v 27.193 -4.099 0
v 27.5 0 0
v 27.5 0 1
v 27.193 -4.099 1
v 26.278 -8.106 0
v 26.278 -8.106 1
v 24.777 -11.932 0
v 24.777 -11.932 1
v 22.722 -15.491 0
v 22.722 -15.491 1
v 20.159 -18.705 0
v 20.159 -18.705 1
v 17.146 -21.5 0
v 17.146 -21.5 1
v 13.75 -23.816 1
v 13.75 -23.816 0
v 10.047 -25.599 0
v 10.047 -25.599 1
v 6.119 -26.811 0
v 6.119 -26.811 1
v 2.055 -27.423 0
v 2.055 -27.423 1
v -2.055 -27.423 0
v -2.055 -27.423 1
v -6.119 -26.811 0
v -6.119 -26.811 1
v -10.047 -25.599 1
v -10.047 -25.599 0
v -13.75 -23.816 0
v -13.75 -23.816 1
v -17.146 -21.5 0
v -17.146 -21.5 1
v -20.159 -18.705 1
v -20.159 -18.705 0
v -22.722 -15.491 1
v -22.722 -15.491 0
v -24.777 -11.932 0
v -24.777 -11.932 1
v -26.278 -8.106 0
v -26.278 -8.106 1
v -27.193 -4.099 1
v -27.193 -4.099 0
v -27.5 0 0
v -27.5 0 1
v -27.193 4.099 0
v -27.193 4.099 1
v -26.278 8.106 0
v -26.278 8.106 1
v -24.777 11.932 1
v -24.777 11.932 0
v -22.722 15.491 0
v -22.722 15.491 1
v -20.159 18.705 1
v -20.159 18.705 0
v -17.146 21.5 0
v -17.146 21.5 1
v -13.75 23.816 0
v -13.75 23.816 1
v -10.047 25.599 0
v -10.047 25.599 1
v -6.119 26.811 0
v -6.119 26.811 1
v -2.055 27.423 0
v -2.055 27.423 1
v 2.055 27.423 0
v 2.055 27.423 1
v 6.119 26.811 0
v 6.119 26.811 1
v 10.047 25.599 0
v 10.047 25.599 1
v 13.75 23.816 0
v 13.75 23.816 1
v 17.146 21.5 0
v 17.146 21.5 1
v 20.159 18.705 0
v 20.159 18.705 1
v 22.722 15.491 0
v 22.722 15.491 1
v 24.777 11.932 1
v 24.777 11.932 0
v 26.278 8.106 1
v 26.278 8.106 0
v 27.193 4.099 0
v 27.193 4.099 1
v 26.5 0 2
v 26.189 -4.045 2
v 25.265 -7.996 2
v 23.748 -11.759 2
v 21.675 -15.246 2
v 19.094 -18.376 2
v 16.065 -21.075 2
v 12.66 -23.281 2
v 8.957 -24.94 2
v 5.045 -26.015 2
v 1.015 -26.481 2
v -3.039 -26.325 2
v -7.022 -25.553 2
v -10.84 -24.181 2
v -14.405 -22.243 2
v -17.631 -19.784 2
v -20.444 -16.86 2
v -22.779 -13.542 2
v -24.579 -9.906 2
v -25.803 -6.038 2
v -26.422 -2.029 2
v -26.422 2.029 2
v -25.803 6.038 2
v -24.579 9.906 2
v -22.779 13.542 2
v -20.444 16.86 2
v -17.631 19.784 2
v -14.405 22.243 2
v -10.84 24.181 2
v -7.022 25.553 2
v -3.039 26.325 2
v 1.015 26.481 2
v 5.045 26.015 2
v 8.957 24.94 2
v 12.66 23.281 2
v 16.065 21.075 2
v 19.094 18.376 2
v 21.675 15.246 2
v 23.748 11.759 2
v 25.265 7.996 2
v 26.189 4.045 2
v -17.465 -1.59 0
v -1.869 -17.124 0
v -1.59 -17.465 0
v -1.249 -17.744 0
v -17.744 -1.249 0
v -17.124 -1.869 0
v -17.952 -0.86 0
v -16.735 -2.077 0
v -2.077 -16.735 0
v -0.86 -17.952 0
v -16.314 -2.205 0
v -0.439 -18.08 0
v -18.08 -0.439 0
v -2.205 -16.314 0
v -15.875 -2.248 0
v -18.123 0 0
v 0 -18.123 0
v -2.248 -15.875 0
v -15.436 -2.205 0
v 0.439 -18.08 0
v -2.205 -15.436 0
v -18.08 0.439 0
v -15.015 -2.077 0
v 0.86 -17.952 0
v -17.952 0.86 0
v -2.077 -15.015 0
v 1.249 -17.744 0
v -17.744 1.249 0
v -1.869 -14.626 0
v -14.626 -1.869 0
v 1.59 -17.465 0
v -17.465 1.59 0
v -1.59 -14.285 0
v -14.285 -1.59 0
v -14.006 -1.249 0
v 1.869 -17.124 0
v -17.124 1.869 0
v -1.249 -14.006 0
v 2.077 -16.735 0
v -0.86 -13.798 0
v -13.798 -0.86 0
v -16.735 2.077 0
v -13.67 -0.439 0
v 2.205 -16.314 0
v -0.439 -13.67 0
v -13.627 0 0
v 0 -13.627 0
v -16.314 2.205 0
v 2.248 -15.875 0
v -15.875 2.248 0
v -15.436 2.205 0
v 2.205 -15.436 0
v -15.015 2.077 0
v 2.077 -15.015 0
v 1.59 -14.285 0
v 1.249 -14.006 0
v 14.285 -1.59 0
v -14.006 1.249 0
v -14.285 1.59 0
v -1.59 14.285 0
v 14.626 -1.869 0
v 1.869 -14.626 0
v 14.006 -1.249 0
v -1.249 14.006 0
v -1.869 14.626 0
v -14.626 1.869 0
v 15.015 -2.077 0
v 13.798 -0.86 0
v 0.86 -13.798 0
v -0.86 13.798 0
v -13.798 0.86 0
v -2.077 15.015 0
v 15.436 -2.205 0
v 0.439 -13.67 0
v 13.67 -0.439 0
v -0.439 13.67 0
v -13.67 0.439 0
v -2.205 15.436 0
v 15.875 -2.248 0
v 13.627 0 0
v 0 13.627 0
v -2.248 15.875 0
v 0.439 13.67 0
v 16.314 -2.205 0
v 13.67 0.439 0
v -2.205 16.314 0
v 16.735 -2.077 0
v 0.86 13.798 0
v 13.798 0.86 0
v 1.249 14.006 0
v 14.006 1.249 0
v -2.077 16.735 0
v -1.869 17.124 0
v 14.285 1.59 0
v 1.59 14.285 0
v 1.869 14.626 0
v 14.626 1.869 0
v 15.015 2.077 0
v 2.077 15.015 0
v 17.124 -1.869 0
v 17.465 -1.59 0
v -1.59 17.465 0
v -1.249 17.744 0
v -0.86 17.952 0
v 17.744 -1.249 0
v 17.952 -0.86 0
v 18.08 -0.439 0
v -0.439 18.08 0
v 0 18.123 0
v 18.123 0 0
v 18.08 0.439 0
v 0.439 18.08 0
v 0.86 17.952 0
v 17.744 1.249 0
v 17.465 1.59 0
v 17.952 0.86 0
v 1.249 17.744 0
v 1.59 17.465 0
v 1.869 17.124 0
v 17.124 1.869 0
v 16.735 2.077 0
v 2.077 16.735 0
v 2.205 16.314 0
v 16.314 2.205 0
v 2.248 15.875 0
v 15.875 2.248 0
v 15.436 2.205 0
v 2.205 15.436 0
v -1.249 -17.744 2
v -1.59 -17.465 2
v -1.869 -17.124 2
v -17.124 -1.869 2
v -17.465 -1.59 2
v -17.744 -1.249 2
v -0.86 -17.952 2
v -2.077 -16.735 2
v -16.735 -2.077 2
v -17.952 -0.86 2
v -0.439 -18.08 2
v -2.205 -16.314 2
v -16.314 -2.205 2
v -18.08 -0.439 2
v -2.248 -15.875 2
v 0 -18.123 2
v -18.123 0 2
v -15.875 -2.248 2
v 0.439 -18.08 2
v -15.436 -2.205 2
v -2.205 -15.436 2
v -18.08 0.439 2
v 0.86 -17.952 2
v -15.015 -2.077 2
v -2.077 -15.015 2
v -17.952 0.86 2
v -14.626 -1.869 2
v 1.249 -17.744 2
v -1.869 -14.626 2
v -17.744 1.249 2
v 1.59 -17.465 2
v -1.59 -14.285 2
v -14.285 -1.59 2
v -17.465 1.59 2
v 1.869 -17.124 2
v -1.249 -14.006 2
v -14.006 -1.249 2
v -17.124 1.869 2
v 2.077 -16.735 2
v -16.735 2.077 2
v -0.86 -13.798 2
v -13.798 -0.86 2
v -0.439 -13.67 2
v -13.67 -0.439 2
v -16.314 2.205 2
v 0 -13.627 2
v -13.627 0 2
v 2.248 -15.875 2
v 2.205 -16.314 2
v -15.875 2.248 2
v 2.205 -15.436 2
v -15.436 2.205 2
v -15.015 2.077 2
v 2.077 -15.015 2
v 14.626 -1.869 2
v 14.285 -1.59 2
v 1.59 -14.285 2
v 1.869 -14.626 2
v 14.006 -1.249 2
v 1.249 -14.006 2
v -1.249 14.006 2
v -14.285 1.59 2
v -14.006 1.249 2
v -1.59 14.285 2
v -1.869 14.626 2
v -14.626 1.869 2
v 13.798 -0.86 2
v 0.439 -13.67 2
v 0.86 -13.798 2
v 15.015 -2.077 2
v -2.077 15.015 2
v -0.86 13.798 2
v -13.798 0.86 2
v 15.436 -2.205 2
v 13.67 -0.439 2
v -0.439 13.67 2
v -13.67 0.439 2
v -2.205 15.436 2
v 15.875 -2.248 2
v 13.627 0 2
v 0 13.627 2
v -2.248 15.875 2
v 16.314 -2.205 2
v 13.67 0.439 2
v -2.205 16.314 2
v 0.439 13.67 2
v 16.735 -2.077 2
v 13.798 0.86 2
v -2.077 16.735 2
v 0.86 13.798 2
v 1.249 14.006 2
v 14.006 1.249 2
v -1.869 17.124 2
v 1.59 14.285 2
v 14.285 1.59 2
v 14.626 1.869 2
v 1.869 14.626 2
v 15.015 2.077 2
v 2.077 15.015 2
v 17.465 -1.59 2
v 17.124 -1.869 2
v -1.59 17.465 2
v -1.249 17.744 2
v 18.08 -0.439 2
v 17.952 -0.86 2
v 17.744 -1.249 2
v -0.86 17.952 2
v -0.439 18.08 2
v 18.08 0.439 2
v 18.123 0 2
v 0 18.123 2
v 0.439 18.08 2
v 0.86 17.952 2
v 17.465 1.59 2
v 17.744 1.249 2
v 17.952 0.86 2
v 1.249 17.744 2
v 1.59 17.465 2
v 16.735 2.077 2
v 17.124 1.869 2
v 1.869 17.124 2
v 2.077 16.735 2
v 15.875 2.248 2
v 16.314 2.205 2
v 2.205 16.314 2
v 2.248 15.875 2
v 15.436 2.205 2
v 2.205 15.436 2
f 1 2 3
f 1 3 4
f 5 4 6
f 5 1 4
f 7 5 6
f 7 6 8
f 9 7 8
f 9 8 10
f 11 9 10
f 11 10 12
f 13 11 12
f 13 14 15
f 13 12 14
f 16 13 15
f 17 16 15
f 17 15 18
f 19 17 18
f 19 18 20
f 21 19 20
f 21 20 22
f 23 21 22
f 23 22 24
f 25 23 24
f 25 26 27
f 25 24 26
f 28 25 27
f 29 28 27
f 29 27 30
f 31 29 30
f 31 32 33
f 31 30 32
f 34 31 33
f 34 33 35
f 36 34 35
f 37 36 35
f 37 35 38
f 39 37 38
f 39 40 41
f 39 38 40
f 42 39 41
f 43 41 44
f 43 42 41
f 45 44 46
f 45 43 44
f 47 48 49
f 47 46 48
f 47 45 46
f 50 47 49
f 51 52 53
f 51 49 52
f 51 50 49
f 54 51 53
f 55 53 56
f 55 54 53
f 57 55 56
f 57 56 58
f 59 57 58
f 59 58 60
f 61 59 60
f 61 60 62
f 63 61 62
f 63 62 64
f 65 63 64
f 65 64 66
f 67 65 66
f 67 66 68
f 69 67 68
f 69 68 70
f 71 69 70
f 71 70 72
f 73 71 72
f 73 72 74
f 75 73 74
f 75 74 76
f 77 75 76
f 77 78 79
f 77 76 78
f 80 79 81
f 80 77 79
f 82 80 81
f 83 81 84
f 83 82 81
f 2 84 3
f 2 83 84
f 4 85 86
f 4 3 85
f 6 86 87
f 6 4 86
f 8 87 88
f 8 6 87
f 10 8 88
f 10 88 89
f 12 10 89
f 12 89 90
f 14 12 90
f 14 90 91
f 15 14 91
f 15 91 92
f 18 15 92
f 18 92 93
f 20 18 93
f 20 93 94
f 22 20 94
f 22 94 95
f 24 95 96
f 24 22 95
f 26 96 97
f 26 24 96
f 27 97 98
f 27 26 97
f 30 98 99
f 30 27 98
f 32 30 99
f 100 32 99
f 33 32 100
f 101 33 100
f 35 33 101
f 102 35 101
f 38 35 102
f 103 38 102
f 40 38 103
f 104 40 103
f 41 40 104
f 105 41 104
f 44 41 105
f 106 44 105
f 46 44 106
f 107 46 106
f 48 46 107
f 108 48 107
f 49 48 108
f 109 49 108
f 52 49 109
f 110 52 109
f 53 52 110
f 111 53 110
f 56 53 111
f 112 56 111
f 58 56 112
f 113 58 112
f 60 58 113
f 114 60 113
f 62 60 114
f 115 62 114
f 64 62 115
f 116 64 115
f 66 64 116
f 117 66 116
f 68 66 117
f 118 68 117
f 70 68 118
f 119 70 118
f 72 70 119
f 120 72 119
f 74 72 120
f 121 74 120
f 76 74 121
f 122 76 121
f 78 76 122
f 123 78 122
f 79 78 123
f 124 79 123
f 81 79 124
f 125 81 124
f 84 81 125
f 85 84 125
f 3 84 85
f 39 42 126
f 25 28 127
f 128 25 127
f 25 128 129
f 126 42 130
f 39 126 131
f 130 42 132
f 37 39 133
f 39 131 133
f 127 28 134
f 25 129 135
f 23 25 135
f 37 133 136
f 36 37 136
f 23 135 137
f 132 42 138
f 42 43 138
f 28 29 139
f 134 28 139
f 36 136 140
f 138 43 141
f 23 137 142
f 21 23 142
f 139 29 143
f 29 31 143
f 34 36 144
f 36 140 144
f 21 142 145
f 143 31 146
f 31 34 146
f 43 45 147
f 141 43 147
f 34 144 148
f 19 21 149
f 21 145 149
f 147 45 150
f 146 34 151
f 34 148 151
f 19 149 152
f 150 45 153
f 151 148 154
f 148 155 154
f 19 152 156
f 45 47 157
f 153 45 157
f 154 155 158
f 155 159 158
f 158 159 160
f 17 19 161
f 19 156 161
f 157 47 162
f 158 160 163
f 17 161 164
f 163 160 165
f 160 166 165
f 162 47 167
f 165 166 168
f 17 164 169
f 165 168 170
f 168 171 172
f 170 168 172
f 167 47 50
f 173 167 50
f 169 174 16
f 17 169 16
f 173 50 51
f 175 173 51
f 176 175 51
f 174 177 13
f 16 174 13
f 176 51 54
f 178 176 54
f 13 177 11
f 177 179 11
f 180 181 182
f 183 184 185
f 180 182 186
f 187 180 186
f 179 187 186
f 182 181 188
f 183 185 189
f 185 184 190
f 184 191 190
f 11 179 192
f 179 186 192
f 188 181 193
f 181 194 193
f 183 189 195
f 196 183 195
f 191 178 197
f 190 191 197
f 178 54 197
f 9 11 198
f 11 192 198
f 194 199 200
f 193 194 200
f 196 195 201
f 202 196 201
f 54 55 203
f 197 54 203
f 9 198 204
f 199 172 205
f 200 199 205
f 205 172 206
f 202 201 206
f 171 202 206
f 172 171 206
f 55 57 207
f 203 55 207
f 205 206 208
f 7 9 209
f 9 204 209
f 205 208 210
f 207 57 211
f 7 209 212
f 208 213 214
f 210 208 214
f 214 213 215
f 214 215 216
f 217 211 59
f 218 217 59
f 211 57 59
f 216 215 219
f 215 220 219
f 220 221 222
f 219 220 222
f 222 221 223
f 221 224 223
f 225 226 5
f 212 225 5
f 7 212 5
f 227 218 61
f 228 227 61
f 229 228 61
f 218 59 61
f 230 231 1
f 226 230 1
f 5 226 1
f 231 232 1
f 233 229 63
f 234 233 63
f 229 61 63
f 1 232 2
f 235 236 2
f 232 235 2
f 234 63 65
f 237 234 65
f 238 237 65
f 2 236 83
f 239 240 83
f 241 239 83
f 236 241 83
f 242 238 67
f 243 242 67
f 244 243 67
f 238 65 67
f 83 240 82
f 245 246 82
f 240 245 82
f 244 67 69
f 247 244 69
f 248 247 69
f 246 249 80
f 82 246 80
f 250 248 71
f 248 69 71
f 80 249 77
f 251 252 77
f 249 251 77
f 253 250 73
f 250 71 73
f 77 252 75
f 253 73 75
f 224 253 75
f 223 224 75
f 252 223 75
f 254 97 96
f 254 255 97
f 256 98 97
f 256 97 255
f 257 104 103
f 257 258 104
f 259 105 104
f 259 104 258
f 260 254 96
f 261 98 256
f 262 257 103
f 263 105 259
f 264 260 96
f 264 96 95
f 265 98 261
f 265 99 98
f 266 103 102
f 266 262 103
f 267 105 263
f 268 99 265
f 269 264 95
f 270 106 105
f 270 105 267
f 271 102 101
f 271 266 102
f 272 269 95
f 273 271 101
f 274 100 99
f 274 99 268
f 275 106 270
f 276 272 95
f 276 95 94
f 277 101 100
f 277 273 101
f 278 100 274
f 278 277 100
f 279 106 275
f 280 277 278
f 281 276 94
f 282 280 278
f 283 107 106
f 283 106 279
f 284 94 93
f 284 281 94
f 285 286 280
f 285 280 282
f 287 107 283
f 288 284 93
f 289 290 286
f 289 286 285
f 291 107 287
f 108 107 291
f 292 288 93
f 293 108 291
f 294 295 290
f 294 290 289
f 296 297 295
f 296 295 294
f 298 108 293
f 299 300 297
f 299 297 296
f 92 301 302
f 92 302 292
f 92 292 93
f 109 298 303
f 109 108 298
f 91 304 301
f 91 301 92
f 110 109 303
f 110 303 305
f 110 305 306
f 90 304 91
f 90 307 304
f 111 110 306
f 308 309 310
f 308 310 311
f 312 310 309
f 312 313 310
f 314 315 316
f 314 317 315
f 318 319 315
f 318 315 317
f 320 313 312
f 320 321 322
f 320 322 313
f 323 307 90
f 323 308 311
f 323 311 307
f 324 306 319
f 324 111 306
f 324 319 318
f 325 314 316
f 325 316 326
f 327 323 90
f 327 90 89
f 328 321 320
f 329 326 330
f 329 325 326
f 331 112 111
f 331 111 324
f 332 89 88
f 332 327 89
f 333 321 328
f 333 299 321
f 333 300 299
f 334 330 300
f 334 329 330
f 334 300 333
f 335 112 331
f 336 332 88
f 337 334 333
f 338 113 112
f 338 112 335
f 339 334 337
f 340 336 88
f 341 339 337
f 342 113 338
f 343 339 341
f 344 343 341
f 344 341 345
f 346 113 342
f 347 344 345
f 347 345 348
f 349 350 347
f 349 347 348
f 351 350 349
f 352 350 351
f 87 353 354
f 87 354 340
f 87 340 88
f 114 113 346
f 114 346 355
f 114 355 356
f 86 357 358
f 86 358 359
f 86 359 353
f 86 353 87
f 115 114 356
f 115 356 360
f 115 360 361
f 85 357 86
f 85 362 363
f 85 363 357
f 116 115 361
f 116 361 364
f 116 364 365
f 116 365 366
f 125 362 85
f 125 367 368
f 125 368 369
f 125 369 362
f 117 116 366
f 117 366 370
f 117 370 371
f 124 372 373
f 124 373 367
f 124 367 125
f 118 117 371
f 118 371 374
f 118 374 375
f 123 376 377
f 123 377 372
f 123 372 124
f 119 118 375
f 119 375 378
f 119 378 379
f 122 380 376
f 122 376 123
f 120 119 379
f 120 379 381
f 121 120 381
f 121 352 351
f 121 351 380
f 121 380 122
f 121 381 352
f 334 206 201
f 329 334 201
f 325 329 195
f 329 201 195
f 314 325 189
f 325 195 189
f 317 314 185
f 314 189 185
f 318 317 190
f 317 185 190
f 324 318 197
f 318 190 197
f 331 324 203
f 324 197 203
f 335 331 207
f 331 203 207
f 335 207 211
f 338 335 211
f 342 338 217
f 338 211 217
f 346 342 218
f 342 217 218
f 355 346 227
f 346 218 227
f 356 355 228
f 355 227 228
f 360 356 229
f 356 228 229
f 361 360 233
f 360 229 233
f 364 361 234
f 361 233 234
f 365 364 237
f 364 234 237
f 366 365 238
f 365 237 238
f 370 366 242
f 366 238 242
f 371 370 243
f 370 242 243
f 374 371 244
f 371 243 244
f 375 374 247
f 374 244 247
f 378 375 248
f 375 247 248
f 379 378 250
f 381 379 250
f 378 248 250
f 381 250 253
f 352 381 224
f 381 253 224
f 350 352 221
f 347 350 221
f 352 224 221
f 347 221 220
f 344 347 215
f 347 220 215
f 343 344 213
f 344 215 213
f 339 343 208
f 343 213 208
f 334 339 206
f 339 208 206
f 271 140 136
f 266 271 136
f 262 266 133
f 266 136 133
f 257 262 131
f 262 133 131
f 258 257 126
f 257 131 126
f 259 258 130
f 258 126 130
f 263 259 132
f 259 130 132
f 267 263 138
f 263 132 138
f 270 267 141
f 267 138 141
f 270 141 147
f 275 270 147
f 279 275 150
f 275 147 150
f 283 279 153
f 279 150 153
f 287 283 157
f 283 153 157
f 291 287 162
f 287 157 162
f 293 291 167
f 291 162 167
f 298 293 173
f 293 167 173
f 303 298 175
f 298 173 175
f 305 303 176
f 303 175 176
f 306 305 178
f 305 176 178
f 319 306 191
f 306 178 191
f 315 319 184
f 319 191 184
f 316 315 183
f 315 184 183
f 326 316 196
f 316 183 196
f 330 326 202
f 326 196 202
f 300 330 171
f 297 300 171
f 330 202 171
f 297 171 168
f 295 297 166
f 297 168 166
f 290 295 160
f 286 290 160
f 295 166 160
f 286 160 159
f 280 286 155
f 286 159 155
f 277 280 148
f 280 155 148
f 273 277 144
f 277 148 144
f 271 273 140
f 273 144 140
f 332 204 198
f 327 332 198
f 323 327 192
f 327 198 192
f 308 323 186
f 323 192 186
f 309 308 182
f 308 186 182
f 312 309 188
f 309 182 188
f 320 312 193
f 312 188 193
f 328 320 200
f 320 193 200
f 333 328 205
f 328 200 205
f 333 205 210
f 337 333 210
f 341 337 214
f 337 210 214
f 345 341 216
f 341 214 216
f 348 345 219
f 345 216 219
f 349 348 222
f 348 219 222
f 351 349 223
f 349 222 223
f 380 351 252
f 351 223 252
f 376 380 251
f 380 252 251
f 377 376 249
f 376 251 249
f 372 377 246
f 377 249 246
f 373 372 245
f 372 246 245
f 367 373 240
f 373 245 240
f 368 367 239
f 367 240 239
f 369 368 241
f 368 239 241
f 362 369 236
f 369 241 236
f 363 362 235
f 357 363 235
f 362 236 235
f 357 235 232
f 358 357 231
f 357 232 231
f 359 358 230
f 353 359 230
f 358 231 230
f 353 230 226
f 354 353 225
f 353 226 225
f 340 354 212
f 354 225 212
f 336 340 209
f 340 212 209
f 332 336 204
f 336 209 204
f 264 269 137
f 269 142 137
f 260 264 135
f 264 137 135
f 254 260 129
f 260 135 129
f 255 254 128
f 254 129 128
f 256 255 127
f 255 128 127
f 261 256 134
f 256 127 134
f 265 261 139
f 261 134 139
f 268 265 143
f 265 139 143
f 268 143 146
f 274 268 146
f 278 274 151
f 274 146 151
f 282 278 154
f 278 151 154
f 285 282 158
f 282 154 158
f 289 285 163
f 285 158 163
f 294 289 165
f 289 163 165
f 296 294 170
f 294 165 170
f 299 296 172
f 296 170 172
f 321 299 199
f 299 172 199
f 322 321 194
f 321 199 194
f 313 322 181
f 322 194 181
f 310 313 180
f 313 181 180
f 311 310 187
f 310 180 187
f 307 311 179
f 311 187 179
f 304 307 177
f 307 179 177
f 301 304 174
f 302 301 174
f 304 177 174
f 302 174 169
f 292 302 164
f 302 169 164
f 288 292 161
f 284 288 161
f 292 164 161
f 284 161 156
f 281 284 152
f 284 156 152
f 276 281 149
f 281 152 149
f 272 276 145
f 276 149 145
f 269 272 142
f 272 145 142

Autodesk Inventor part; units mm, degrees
ref_plane "YZ Plane" through (0, 0, 0) normal (1, 0, 0) x (0, 1, 0)
ref_plane "XZ Plane" through (0, 0, 0) normal (0, 1, 0) x (-1, 0, 0)
ref_plane "XY Plane" through (0, 0, 0) normal (0, 0, 1) x (1, 0, 0)
sketch "Sketch1" plane through (0, 0, 0) normal (0, 0, 1) x (1, 0, 0)
  circle A0 centre (0, 0) radius 27.5
  dimension "d0" = 55
extrude "Extrusion1" add sketch "Sketch1" along normal blind 2
chamfer "Chamfer1" distance 1 angle 45 1 edges at (-27.5, 0, 2)
sketch "Sketch2" plane through (0, 0, 2) normal (0, 0, 1) x (1, 0, 0)
  circle A0 centre (0, 0) radius 15.875 construction
  point P0 (0, 15.875)
  point P1 (-15.875, 0)
  point P2 (0, -15.875)
  point P3 (15.875, 0)
  dimension "d6" = 31.75
  dimension "d9" = 360
hole "Hole1" at (0, 15.875, 2) at (-15.875, 0, 2) at (0, -15.875, 2) at (15.875, 0, 2) direction (0, 0, -1) diameter 4.4958 end through all clearance for "Flat Head Machine Screw (82)" size "#8" standard "Ansi Unified Screw Threads"
properties part number "53t_gt2_flange" material "Aluminum 6061"
